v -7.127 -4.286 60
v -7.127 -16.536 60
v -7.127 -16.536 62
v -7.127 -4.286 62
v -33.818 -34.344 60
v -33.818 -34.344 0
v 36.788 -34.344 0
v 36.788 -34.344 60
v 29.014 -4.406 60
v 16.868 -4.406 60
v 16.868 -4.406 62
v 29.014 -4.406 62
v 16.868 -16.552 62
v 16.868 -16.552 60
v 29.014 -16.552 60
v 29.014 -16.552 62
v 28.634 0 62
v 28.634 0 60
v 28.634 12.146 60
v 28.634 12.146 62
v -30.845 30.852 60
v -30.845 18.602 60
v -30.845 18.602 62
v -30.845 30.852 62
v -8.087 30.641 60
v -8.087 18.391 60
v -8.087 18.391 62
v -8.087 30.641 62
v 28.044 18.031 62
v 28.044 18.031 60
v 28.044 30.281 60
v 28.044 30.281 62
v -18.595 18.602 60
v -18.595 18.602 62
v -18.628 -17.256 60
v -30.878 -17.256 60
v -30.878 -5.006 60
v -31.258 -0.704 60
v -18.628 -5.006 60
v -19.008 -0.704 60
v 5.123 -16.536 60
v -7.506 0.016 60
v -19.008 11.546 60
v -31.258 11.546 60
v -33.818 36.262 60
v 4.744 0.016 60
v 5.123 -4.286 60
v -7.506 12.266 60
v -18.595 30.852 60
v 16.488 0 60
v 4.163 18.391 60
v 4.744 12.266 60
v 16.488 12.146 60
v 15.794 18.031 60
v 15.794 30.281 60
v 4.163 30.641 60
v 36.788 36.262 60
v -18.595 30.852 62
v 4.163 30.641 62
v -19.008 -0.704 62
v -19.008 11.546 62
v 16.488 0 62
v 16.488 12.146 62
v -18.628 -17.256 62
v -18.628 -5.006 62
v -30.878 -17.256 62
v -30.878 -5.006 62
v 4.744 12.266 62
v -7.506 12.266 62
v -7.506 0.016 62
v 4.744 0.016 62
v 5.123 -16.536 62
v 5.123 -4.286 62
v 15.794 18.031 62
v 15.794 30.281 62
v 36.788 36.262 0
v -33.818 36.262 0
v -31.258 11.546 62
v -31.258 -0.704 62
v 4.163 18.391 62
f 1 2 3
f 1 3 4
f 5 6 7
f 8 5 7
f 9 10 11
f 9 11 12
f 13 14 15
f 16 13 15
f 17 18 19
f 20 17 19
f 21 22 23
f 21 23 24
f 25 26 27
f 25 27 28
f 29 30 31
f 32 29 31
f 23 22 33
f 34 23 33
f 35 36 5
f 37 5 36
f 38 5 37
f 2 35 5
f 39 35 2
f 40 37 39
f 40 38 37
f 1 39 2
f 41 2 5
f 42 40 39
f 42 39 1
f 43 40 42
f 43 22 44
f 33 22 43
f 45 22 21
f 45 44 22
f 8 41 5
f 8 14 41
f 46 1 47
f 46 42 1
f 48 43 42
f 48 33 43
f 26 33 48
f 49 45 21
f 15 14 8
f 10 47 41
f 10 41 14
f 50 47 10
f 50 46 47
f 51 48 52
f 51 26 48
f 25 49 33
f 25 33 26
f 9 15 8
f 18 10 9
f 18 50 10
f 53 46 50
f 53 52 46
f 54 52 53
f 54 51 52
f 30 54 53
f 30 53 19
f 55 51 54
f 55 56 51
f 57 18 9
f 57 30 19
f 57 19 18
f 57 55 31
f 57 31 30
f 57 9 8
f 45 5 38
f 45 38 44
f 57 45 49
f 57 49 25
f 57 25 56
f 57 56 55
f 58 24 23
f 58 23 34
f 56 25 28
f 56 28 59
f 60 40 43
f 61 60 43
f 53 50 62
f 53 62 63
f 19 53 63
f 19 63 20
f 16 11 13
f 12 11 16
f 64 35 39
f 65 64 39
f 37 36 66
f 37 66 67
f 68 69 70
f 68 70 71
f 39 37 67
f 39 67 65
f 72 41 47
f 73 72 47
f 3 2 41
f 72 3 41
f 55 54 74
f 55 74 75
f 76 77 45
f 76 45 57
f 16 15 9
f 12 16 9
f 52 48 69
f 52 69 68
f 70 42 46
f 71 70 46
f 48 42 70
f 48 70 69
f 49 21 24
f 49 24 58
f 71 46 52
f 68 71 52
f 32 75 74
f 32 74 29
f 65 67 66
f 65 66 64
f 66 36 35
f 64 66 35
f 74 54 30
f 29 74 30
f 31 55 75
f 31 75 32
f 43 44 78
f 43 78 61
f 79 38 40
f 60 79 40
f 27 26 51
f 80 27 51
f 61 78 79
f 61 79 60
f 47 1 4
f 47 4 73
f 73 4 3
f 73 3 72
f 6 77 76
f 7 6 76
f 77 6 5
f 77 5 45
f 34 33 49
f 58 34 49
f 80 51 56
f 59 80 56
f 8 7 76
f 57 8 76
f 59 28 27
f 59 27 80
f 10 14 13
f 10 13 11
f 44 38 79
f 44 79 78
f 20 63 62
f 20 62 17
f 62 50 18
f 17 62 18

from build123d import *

# Parameters (mm, degrees)
SKETCH_W      = 70.606116
SKETCH_H      = 70.606116
PAD_DEPTH     = 60
SKETCH002_W   = 12.25
SKETCH002_H   = 12.25
SKETCH002_W_2 = 12.146065
SKETCH002_H_2 = 12.146065
PAD001_DEPTH  = 2


with BuildPart() as part:
    # Sketch → Pad (new body)
    with BuildSketch(Plane.XY):
        with Locations((1.484864, 0.958671)):
            Rectangle(SKETCH_W, SKETCH_H)
    extrude(amount=PAD_DEPTH)

    # Sketch002 (on Face6 of Pad) → Pad001 (join)
    with BuildSketch(Plane.XY.offset(60)):
        with Locations((-24.720272, 24.727009)):
            Rectangle(SKETCH002_W, SKETCH002_H)
        with Locations((-1.962364, 24.515921)):
            Rectangle(SKETCH002_W, SKETCH002_H)
        with Locations((21.918622, 24.155907)):
            Rectangle(SKETCH002_W, SKETCH002_H)
        with Locations((-25.132774, 5.421042)):
            Rectangle(SKETCH002_W, SKETCH002_H)
        with Locations((-1.381286, 6.141071)):
            Rectangle(SKETCH002_W, SKETCH002_H)
        with Locations((22.56116, 6.073033)):
            Rectangle(SKETCH002_W_2, SKETCH002_H_2)
        with Locations((-24.753076, -11.130706)):
            Rectangle(SKETCH002_W, SKETCH002_H)
        with Locations((-1.001588, -10.410677)):
            Rectangle(SKETCH002_W, SKETCH002_H)
        with Locations((22.940858, -10.478715)):
            Rectangle(SKETCH002_W_2, SKETCH002_H_2)
    extrude(amount=PAD001_DEPTH)


solid = part.part
